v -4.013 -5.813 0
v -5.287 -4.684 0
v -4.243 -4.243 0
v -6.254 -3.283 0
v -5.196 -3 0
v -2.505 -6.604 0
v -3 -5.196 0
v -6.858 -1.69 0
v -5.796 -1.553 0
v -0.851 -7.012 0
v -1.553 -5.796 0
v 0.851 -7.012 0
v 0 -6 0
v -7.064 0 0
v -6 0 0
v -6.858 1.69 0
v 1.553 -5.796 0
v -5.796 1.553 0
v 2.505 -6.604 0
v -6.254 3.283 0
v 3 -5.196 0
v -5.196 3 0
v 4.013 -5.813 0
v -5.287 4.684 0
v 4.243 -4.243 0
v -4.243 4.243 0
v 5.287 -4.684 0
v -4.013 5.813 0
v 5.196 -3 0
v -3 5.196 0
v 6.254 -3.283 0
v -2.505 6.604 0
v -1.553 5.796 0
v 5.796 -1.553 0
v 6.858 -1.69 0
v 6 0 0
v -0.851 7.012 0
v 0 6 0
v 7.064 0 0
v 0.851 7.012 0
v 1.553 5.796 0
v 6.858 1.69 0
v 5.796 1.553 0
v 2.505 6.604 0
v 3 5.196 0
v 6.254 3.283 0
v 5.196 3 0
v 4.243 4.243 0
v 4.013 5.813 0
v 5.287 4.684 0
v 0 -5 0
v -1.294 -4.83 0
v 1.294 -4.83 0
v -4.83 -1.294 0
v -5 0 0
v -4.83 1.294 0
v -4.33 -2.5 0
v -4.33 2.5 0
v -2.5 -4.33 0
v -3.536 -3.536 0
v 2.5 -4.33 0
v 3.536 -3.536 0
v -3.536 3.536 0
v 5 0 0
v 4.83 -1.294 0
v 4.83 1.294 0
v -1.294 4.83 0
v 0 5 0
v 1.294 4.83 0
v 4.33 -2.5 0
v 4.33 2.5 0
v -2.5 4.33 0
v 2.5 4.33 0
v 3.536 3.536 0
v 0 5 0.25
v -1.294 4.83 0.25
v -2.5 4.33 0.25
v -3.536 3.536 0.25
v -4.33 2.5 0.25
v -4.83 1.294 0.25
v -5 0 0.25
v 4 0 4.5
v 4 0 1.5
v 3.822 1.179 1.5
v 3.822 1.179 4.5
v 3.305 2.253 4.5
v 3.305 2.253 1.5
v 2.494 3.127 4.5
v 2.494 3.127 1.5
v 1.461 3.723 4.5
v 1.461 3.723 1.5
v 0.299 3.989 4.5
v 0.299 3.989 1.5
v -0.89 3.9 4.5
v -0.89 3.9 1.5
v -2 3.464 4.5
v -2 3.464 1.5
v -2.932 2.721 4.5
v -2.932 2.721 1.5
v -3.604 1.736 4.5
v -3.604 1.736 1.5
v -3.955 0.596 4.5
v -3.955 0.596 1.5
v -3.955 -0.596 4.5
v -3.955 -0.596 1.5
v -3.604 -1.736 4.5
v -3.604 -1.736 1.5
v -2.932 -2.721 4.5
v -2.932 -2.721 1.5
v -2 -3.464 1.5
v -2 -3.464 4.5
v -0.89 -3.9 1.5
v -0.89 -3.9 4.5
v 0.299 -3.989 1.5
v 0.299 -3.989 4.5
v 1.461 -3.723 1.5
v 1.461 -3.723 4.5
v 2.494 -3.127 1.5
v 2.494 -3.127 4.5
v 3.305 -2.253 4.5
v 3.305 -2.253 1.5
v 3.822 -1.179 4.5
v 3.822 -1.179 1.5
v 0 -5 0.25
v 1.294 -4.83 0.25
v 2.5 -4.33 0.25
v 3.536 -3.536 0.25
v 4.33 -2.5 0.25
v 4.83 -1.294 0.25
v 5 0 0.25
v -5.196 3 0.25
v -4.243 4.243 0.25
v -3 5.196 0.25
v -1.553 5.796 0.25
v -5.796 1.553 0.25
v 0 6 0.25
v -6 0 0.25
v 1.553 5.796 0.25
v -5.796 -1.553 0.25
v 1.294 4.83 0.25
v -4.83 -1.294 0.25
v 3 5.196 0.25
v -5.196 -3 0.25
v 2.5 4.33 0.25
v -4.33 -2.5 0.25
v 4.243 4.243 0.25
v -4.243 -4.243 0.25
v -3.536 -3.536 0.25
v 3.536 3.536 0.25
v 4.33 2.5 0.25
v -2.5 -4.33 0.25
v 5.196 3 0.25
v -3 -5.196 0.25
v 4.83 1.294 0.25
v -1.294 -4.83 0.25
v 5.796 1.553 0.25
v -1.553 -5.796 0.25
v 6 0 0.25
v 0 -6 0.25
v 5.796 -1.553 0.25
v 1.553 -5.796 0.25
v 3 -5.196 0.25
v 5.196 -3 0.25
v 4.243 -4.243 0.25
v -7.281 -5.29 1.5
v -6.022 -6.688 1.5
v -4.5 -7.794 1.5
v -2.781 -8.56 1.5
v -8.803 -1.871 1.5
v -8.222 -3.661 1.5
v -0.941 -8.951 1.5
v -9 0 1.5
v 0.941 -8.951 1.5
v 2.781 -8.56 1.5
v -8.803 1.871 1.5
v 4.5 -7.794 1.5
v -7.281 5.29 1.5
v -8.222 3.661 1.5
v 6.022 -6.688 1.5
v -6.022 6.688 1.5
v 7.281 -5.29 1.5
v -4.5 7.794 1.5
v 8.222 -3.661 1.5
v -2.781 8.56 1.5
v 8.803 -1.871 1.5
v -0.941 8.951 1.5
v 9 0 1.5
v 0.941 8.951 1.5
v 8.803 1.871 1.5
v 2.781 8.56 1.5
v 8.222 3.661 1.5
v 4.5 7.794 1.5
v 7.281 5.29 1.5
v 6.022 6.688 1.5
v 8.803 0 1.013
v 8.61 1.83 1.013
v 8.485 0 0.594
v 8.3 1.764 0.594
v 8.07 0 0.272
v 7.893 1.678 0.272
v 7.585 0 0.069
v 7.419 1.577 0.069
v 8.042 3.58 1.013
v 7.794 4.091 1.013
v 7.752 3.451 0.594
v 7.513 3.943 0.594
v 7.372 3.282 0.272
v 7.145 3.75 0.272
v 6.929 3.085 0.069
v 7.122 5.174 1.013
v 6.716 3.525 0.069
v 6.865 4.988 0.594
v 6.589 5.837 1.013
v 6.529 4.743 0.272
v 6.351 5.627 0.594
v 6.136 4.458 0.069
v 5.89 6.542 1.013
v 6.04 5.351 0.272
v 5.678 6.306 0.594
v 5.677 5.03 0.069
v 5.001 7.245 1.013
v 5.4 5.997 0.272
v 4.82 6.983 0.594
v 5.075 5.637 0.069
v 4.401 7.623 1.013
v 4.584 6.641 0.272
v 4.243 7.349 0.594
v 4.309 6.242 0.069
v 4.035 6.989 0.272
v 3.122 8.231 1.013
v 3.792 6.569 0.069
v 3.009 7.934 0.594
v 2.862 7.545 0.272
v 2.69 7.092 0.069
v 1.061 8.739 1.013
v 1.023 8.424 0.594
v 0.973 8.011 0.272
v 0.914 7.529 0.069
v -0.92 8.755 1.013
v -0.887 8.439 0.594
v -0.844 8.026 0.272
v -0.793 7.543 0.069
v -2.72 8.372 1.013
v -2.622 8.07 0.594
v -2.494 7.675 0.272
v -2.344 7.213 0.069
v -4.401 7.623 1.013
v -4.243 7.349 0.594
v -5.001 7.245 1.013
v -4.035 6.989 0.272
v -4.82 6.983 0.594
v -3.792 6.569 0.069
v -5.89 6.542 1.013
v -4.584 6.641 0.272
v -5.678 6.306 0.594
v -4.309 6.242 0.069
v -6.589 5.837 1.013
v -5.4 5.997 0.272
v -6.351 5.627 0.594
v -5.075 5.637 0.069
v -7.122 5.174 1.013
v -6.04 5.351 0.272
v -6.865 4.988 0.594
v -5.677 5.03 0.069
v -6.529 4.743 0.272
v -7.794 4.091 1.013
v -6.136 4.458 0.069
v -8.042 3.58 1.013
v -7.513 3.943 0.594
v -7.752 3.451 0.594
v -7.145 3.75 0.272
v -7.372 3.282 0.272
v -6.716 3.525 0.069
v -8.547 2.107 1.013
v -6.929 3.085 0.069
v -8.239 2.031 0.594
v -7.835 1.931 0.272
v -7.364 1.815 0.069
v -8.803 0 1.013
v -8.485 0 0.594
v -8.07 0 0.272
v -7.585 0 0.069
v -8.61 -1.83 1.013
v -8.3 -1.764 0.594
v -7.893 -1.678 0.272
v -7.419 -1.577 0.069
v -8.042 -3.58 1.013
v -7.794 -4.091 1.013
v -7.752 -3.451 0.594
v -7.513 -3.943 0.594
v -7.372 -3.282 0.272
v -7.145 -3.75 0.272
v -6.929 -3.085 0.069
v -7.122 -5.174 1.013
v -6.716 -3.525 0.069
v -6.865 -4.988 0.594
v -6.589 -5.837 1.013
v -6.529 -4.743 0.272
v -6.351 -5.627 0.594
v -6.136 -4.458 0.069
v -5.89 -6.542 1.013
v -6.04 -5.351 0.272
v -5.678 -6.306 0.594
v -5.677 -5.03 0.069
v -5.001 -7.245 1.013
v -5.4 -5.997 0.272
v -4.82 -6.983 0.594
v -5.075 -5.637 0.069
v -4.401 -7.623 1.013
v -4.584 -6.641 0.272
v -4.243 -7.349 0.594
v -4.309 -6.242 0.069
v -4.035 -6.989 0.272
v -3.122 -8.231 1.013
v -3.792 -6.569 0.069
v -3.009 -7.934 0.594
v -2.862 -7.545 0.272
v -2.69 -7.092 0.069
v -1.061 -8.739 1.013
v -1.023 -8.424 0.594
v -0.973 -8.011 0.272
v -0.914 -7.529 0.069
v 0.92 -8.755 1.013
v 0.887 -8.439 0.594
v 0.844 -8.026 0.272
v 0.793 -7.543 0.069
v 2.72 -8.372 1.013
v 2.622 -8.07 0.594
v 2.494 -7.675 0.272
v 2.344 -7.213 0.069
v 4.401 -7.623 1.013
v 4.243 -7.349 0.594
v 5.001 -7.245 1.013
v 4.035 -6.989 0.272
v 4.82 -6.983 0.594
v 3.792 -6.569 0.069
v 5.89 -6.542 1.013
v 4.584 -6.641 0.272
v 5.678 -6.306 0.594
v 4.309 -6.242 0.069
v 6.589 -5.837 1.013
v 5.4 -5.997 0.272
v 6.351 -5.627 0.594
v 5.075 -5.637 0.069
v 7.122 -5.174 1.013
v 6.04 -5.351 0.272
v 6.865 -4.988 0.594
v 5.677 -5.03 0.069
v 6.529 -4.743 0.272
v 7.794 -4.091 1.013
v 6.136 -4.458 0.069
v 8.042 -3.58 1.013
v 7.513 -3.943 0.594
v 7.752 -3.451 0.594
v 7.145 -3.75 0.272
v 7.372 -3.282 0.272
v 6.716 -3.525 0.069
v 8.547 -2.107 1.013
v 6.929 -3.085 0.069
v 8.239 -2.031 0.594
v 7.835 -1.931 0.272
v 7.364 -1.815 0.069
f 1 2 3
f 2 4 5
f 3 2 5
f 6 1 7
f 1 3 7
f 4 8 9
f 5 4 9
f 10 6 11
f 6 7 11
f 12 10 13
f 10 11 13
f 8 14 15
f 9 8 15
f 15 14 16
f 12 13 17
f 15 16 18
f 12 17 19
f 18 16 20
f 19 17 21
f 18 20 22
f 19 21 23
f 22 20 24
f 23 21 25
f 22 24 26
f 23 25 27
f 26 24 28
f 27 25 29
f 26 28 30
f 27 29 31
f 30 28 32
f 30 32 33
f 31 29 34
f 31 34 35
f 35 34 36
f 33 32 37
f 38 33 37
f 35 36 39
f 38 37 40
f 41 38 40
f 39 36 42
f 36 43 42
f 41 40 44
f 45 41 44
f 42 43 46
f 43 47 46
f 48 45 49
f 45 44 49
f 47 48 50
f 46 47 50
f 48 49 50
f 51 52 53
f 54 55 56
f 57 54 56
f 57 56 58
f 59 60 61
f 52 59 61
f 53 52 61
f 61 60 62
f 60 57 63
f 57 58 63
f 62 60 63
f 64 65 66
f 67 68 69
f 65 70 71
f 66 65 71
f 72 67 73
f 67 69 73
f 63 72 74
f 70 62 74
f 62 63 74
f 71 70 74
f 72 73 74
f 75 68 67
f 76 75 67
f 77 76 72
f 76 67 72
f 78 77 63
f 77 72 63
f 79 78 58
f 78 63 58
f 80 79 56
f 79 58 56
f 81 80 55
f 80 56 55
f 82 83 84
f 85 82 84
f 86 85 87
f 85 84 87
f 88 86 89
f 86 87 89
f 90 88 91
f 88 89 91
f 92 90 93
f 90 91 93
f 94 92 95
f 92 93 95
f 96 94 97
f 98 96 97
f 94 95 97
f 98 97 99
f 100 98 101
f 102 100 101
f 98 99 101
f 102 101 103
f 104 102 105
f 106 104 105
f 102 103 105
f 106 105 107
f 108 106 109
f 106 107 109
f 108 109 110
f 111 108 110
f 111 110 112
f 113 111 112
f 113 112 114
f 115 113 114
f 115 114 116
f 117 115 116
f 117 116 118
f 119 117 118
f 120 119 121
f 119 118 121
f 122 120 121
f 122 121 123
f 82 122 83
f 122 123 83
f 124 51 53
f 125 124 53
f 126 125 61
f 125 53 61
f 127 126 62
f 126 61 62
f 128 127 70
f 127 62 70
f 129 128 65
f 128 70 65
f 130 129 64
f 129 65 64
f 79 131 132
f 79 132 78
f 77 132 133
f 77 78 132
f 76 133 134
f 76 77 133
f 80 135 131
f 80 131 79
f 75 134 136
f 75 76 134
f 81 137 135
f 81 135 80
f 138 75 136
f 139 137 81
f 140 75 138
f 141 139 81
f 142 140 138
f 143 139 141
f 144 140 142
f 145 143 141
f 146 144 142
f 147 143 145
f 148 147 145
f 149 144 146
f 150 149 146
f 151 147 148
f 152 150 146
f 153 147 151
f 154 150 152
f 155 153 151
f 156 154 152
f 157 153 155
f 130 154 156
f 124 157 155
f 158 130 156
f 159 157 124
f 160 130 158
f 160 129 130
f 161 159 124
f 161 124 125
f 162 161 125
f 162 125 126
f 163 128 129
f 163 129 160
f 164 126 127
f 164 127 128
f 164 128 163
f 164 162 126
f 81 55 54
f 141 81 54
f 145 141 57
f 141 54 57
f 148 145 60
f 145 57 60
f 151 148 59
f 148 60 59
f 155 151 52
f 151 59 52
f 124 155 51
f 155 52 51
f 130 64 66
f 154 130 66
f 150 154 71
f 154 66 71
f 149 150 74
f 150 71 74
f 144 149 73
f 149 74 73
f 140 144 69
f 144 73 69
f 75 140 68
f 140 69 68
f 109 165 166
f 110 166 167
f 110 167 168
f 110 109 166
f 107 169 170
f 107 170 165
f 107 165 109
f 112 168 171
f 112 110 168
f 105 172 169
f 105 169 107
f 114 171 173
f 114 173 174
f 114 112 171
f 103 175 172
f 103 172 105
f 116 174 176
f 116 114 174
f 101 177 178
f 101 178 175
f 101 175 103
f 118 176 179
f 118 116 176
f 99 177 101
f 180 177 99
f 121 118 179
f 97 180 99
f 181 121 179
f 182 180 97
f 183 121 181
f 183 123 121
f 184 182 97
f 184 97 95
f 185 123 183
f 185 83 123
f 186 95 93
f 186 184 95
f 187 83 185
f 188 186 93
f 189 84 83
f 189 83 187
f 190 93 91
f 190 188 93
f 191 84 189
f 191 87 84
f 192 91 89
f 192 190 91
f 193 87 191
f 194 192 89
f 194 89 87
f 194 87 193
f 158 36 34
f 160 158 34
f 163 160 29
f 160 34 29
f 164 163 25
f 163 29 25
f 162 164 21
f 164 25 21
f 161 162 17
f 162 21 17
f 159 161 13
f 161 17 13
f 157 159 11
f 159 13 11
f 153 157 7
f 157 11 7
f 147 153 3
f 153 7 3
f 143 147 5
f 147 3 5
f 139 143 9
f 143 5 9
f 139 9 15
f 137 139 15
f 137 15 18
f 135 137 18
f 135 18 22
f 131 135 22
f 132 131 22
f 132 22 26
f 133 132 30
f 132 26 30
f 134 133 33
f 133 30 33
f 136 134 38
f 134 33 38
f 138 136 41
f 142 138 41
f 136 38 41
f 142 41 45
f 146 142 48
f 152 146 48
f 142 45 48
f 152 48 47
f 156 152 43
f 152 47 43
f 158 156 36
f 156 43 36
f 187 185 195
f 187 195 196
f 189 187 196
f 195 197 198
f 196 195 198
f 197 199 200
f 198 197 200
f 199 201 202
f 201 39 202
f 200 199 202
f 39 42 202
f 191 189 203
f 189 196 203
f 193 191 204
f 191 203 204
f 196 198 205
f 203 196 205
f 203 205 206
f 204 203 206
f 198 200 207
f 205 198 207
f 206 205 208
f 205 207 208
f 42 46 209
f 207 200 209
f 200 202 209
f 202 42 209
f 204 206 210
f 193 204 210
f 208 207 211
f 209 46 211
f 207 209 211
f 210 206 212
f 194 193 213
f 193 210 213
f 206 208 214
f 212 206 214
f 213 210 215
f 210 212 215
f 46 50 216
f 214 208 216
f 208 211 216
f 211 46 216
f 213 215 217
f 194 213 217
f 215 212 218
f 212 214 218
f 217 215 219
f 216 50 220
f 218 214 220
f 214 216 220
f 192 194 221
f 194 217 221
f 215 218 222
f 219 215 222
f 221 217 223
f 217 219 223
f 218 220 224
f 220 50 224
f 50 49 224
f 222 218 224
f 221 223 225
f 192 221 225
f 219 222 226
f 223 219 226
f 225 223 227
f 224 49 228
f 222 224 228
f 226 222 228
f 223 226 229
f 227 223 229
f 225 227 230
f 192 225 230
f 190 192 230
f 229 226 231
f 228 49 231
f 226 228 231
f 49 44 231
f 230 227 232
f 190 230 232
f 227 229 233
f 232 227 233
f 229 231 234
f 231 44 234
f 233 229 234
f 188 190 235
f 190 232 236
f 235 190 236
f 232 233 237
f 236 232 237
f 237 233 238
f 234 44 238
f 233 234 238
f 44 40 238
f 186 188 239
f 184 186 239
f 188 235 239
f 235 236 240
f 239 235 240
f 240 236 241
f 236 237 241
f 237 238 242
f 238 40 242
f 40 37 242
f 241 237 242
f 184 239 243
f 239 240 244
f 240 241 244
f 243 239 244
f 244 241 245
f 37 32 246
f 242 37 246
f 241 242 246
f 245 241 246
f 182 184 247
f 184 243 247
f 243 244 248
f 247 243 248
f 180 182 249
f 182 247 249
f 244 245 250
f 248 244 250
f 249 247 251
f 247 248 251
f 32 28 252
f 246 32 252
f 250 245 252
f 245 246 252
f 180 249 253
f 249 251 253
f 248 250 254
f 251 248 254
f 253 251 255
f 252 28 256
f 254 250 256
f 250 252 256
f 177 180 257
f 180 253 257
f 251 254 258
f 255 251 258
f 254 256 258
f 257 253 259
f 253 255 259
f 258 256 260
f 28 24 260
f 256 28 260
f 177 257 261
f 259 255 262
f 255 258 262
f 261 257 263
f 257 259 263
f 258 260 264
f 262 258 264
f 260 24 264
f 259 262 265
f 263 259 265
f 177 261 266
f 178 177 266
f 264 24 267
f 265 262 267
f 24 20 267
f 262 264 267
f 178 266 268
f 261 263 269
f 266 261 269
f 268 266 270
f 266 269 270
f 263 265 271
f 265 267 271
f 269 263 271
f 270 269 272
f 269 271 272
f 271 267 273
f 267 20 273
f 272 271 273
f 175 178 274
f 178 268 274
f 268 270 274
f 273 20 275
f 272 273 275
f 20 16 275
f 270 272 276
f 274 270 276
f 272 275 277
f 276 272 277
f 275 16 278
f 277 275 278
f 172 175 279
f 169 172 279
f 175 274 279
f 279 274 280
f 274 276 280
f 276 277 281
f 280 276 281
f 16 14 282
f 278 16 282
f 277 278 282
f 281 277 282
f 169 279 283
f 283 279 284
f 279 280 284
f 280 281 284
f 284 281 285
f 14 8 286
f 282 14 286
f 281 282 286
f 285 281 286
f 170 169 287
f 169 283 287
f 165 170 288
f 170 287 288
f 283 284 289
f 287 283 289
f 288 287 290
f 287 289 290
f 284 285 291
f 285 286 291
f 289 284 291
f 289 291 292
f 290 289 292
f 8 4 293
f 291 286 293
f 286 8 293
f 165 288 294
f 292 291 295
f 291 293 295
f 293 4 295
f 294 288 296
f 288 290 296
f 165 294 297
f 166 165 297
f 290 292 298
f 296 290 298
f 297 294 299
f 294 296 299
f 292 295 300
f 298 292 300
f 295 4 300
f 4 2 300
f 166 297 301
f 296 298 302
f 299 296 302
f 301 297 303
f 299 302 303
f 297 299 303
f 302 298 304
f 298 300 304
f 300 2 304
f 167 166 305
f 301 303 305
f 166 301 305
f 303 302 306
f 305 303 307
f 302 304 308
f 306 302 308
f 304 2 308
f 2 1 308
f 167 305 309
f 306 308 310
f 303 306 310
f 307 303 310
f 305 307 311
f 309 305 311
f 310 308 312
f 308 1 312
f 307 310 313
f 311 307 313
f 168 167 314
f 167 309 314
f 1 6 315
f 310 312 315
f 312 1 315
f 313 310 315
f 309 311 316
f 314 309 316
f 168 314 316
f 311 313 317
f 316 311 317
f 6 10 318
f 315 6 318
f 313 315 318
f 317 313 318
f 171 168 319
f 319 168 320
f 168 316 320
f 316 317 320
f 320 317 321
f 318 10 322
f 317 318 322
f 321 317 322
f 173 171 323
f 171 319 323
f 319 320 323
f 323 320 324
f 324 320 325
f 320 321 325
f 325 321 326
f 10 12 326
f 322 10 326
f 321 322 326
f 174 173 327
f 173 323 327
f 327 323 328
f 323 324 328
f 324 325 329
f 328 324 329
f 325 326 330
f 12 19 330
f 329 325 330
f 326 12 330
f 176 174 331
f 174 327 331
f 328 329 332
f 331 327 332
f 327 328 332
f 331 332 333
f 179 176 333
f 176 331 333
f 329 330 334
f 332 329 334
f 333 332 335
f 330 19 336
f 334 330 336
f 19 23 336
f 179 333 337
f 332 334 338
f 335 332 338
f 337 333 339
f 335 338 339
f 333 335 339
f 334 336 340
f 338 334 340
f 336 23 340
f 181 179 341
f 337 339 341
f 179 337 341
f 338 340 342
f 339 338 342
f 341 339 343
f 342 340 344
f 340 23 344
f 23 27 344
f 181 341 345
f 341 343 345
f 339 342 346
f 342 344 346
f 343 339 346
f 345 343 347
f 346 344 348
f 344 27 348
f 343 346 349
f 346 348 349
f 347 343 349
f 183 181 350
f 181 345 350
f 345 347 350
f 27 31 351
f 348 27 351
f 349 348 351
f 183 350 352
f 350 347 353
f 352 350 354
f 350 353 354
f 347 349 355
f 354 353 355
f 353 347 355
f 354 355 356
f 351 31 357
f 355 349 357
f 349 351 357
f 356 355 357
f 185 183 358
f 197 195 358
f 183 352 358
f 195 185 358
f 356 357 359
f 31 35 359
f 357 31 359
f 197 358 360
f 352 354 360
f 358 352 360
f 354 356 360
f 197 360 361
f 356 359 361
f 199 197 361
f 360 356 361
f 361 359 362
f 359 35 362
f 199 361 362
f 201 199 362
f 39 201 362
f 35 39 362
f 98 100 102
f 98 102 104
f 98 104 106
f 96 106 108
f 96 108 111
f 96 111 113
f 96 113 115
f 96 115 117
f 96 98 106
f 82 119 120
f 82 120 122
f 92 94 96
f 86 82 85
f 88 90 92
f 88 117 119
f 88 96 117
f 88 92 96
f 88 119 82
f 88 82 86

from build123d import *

# Parameters (mm, degrees)
F0_R     = 9
F1_DEPTH = 1.5
F2_R     = 4
F3_DEPTH = 3
F5_R     = 6
F6_DEPTH = 0.25


# Not quite as in the source:
# - a fillet or chamfer that OpenCascade refuses, or shapes differently, is made with other operations: its cross-section is extruded or revolved along the edge and cut away or added


with BuildPart() as f1:
    # F0 (on Top) → F1 (new body)
    with BuildSketch(Plane.XY):
        Circle(F0_R)
    extrude(amount=F1_DEPTH)

    # F2 (on face) → F3 (join)
    with BuildSketch(Plane.XY.offset(1.5)):
        Circle(F2_R)
    extrude(amount=F3_DEPTH)

    # F4: fillet of radius 2 on 1 edges, made by hand

    # F4_s1 → F4_t2 (revolve, cut)
    with BuildSketch(Plane.XZ):
        with BuildLine():
            ThreePointArc((9, 1.5), (8.2882531983, 0.4188611699), (7.0635083269, 0))
            Line((7.0635083269, 0), (9, 0))
            Line((9, 0), (9, 1.5))
        make_face()
    revolve(axis=Axis((0, 0, 0), (0, 0, 1)), mode=Mode.SUBTRACT)

    # F5 (on face) → F6 (cut)
    with BuildSketch(Plane(origin=(0, 0, 0), x_dir=(1, 0, 0), z_dir=(0, 0, -1))):
        Circle(F5_R)
        with BuildLine():
            ThreePointArc((0, 5), (3.5355339059, 3.5355339059), (5, 0))
            ThreePointArc((5, 0), (3.5355339059, -3.5355339059), (0, -5))
            ThreePointArc((0, -5), (-3.5355339059, -3.5355339059), (-5, 0))
            ThreePointArc((-5, 0), (-3.5355339059, 3.5355339059), (0, 5))
        make_face(mode=Mode.SUBTRACT)
    extrude(amount=-F6_DEPTH, mode=Mode.SUBTRACT)


solid = f1.part
